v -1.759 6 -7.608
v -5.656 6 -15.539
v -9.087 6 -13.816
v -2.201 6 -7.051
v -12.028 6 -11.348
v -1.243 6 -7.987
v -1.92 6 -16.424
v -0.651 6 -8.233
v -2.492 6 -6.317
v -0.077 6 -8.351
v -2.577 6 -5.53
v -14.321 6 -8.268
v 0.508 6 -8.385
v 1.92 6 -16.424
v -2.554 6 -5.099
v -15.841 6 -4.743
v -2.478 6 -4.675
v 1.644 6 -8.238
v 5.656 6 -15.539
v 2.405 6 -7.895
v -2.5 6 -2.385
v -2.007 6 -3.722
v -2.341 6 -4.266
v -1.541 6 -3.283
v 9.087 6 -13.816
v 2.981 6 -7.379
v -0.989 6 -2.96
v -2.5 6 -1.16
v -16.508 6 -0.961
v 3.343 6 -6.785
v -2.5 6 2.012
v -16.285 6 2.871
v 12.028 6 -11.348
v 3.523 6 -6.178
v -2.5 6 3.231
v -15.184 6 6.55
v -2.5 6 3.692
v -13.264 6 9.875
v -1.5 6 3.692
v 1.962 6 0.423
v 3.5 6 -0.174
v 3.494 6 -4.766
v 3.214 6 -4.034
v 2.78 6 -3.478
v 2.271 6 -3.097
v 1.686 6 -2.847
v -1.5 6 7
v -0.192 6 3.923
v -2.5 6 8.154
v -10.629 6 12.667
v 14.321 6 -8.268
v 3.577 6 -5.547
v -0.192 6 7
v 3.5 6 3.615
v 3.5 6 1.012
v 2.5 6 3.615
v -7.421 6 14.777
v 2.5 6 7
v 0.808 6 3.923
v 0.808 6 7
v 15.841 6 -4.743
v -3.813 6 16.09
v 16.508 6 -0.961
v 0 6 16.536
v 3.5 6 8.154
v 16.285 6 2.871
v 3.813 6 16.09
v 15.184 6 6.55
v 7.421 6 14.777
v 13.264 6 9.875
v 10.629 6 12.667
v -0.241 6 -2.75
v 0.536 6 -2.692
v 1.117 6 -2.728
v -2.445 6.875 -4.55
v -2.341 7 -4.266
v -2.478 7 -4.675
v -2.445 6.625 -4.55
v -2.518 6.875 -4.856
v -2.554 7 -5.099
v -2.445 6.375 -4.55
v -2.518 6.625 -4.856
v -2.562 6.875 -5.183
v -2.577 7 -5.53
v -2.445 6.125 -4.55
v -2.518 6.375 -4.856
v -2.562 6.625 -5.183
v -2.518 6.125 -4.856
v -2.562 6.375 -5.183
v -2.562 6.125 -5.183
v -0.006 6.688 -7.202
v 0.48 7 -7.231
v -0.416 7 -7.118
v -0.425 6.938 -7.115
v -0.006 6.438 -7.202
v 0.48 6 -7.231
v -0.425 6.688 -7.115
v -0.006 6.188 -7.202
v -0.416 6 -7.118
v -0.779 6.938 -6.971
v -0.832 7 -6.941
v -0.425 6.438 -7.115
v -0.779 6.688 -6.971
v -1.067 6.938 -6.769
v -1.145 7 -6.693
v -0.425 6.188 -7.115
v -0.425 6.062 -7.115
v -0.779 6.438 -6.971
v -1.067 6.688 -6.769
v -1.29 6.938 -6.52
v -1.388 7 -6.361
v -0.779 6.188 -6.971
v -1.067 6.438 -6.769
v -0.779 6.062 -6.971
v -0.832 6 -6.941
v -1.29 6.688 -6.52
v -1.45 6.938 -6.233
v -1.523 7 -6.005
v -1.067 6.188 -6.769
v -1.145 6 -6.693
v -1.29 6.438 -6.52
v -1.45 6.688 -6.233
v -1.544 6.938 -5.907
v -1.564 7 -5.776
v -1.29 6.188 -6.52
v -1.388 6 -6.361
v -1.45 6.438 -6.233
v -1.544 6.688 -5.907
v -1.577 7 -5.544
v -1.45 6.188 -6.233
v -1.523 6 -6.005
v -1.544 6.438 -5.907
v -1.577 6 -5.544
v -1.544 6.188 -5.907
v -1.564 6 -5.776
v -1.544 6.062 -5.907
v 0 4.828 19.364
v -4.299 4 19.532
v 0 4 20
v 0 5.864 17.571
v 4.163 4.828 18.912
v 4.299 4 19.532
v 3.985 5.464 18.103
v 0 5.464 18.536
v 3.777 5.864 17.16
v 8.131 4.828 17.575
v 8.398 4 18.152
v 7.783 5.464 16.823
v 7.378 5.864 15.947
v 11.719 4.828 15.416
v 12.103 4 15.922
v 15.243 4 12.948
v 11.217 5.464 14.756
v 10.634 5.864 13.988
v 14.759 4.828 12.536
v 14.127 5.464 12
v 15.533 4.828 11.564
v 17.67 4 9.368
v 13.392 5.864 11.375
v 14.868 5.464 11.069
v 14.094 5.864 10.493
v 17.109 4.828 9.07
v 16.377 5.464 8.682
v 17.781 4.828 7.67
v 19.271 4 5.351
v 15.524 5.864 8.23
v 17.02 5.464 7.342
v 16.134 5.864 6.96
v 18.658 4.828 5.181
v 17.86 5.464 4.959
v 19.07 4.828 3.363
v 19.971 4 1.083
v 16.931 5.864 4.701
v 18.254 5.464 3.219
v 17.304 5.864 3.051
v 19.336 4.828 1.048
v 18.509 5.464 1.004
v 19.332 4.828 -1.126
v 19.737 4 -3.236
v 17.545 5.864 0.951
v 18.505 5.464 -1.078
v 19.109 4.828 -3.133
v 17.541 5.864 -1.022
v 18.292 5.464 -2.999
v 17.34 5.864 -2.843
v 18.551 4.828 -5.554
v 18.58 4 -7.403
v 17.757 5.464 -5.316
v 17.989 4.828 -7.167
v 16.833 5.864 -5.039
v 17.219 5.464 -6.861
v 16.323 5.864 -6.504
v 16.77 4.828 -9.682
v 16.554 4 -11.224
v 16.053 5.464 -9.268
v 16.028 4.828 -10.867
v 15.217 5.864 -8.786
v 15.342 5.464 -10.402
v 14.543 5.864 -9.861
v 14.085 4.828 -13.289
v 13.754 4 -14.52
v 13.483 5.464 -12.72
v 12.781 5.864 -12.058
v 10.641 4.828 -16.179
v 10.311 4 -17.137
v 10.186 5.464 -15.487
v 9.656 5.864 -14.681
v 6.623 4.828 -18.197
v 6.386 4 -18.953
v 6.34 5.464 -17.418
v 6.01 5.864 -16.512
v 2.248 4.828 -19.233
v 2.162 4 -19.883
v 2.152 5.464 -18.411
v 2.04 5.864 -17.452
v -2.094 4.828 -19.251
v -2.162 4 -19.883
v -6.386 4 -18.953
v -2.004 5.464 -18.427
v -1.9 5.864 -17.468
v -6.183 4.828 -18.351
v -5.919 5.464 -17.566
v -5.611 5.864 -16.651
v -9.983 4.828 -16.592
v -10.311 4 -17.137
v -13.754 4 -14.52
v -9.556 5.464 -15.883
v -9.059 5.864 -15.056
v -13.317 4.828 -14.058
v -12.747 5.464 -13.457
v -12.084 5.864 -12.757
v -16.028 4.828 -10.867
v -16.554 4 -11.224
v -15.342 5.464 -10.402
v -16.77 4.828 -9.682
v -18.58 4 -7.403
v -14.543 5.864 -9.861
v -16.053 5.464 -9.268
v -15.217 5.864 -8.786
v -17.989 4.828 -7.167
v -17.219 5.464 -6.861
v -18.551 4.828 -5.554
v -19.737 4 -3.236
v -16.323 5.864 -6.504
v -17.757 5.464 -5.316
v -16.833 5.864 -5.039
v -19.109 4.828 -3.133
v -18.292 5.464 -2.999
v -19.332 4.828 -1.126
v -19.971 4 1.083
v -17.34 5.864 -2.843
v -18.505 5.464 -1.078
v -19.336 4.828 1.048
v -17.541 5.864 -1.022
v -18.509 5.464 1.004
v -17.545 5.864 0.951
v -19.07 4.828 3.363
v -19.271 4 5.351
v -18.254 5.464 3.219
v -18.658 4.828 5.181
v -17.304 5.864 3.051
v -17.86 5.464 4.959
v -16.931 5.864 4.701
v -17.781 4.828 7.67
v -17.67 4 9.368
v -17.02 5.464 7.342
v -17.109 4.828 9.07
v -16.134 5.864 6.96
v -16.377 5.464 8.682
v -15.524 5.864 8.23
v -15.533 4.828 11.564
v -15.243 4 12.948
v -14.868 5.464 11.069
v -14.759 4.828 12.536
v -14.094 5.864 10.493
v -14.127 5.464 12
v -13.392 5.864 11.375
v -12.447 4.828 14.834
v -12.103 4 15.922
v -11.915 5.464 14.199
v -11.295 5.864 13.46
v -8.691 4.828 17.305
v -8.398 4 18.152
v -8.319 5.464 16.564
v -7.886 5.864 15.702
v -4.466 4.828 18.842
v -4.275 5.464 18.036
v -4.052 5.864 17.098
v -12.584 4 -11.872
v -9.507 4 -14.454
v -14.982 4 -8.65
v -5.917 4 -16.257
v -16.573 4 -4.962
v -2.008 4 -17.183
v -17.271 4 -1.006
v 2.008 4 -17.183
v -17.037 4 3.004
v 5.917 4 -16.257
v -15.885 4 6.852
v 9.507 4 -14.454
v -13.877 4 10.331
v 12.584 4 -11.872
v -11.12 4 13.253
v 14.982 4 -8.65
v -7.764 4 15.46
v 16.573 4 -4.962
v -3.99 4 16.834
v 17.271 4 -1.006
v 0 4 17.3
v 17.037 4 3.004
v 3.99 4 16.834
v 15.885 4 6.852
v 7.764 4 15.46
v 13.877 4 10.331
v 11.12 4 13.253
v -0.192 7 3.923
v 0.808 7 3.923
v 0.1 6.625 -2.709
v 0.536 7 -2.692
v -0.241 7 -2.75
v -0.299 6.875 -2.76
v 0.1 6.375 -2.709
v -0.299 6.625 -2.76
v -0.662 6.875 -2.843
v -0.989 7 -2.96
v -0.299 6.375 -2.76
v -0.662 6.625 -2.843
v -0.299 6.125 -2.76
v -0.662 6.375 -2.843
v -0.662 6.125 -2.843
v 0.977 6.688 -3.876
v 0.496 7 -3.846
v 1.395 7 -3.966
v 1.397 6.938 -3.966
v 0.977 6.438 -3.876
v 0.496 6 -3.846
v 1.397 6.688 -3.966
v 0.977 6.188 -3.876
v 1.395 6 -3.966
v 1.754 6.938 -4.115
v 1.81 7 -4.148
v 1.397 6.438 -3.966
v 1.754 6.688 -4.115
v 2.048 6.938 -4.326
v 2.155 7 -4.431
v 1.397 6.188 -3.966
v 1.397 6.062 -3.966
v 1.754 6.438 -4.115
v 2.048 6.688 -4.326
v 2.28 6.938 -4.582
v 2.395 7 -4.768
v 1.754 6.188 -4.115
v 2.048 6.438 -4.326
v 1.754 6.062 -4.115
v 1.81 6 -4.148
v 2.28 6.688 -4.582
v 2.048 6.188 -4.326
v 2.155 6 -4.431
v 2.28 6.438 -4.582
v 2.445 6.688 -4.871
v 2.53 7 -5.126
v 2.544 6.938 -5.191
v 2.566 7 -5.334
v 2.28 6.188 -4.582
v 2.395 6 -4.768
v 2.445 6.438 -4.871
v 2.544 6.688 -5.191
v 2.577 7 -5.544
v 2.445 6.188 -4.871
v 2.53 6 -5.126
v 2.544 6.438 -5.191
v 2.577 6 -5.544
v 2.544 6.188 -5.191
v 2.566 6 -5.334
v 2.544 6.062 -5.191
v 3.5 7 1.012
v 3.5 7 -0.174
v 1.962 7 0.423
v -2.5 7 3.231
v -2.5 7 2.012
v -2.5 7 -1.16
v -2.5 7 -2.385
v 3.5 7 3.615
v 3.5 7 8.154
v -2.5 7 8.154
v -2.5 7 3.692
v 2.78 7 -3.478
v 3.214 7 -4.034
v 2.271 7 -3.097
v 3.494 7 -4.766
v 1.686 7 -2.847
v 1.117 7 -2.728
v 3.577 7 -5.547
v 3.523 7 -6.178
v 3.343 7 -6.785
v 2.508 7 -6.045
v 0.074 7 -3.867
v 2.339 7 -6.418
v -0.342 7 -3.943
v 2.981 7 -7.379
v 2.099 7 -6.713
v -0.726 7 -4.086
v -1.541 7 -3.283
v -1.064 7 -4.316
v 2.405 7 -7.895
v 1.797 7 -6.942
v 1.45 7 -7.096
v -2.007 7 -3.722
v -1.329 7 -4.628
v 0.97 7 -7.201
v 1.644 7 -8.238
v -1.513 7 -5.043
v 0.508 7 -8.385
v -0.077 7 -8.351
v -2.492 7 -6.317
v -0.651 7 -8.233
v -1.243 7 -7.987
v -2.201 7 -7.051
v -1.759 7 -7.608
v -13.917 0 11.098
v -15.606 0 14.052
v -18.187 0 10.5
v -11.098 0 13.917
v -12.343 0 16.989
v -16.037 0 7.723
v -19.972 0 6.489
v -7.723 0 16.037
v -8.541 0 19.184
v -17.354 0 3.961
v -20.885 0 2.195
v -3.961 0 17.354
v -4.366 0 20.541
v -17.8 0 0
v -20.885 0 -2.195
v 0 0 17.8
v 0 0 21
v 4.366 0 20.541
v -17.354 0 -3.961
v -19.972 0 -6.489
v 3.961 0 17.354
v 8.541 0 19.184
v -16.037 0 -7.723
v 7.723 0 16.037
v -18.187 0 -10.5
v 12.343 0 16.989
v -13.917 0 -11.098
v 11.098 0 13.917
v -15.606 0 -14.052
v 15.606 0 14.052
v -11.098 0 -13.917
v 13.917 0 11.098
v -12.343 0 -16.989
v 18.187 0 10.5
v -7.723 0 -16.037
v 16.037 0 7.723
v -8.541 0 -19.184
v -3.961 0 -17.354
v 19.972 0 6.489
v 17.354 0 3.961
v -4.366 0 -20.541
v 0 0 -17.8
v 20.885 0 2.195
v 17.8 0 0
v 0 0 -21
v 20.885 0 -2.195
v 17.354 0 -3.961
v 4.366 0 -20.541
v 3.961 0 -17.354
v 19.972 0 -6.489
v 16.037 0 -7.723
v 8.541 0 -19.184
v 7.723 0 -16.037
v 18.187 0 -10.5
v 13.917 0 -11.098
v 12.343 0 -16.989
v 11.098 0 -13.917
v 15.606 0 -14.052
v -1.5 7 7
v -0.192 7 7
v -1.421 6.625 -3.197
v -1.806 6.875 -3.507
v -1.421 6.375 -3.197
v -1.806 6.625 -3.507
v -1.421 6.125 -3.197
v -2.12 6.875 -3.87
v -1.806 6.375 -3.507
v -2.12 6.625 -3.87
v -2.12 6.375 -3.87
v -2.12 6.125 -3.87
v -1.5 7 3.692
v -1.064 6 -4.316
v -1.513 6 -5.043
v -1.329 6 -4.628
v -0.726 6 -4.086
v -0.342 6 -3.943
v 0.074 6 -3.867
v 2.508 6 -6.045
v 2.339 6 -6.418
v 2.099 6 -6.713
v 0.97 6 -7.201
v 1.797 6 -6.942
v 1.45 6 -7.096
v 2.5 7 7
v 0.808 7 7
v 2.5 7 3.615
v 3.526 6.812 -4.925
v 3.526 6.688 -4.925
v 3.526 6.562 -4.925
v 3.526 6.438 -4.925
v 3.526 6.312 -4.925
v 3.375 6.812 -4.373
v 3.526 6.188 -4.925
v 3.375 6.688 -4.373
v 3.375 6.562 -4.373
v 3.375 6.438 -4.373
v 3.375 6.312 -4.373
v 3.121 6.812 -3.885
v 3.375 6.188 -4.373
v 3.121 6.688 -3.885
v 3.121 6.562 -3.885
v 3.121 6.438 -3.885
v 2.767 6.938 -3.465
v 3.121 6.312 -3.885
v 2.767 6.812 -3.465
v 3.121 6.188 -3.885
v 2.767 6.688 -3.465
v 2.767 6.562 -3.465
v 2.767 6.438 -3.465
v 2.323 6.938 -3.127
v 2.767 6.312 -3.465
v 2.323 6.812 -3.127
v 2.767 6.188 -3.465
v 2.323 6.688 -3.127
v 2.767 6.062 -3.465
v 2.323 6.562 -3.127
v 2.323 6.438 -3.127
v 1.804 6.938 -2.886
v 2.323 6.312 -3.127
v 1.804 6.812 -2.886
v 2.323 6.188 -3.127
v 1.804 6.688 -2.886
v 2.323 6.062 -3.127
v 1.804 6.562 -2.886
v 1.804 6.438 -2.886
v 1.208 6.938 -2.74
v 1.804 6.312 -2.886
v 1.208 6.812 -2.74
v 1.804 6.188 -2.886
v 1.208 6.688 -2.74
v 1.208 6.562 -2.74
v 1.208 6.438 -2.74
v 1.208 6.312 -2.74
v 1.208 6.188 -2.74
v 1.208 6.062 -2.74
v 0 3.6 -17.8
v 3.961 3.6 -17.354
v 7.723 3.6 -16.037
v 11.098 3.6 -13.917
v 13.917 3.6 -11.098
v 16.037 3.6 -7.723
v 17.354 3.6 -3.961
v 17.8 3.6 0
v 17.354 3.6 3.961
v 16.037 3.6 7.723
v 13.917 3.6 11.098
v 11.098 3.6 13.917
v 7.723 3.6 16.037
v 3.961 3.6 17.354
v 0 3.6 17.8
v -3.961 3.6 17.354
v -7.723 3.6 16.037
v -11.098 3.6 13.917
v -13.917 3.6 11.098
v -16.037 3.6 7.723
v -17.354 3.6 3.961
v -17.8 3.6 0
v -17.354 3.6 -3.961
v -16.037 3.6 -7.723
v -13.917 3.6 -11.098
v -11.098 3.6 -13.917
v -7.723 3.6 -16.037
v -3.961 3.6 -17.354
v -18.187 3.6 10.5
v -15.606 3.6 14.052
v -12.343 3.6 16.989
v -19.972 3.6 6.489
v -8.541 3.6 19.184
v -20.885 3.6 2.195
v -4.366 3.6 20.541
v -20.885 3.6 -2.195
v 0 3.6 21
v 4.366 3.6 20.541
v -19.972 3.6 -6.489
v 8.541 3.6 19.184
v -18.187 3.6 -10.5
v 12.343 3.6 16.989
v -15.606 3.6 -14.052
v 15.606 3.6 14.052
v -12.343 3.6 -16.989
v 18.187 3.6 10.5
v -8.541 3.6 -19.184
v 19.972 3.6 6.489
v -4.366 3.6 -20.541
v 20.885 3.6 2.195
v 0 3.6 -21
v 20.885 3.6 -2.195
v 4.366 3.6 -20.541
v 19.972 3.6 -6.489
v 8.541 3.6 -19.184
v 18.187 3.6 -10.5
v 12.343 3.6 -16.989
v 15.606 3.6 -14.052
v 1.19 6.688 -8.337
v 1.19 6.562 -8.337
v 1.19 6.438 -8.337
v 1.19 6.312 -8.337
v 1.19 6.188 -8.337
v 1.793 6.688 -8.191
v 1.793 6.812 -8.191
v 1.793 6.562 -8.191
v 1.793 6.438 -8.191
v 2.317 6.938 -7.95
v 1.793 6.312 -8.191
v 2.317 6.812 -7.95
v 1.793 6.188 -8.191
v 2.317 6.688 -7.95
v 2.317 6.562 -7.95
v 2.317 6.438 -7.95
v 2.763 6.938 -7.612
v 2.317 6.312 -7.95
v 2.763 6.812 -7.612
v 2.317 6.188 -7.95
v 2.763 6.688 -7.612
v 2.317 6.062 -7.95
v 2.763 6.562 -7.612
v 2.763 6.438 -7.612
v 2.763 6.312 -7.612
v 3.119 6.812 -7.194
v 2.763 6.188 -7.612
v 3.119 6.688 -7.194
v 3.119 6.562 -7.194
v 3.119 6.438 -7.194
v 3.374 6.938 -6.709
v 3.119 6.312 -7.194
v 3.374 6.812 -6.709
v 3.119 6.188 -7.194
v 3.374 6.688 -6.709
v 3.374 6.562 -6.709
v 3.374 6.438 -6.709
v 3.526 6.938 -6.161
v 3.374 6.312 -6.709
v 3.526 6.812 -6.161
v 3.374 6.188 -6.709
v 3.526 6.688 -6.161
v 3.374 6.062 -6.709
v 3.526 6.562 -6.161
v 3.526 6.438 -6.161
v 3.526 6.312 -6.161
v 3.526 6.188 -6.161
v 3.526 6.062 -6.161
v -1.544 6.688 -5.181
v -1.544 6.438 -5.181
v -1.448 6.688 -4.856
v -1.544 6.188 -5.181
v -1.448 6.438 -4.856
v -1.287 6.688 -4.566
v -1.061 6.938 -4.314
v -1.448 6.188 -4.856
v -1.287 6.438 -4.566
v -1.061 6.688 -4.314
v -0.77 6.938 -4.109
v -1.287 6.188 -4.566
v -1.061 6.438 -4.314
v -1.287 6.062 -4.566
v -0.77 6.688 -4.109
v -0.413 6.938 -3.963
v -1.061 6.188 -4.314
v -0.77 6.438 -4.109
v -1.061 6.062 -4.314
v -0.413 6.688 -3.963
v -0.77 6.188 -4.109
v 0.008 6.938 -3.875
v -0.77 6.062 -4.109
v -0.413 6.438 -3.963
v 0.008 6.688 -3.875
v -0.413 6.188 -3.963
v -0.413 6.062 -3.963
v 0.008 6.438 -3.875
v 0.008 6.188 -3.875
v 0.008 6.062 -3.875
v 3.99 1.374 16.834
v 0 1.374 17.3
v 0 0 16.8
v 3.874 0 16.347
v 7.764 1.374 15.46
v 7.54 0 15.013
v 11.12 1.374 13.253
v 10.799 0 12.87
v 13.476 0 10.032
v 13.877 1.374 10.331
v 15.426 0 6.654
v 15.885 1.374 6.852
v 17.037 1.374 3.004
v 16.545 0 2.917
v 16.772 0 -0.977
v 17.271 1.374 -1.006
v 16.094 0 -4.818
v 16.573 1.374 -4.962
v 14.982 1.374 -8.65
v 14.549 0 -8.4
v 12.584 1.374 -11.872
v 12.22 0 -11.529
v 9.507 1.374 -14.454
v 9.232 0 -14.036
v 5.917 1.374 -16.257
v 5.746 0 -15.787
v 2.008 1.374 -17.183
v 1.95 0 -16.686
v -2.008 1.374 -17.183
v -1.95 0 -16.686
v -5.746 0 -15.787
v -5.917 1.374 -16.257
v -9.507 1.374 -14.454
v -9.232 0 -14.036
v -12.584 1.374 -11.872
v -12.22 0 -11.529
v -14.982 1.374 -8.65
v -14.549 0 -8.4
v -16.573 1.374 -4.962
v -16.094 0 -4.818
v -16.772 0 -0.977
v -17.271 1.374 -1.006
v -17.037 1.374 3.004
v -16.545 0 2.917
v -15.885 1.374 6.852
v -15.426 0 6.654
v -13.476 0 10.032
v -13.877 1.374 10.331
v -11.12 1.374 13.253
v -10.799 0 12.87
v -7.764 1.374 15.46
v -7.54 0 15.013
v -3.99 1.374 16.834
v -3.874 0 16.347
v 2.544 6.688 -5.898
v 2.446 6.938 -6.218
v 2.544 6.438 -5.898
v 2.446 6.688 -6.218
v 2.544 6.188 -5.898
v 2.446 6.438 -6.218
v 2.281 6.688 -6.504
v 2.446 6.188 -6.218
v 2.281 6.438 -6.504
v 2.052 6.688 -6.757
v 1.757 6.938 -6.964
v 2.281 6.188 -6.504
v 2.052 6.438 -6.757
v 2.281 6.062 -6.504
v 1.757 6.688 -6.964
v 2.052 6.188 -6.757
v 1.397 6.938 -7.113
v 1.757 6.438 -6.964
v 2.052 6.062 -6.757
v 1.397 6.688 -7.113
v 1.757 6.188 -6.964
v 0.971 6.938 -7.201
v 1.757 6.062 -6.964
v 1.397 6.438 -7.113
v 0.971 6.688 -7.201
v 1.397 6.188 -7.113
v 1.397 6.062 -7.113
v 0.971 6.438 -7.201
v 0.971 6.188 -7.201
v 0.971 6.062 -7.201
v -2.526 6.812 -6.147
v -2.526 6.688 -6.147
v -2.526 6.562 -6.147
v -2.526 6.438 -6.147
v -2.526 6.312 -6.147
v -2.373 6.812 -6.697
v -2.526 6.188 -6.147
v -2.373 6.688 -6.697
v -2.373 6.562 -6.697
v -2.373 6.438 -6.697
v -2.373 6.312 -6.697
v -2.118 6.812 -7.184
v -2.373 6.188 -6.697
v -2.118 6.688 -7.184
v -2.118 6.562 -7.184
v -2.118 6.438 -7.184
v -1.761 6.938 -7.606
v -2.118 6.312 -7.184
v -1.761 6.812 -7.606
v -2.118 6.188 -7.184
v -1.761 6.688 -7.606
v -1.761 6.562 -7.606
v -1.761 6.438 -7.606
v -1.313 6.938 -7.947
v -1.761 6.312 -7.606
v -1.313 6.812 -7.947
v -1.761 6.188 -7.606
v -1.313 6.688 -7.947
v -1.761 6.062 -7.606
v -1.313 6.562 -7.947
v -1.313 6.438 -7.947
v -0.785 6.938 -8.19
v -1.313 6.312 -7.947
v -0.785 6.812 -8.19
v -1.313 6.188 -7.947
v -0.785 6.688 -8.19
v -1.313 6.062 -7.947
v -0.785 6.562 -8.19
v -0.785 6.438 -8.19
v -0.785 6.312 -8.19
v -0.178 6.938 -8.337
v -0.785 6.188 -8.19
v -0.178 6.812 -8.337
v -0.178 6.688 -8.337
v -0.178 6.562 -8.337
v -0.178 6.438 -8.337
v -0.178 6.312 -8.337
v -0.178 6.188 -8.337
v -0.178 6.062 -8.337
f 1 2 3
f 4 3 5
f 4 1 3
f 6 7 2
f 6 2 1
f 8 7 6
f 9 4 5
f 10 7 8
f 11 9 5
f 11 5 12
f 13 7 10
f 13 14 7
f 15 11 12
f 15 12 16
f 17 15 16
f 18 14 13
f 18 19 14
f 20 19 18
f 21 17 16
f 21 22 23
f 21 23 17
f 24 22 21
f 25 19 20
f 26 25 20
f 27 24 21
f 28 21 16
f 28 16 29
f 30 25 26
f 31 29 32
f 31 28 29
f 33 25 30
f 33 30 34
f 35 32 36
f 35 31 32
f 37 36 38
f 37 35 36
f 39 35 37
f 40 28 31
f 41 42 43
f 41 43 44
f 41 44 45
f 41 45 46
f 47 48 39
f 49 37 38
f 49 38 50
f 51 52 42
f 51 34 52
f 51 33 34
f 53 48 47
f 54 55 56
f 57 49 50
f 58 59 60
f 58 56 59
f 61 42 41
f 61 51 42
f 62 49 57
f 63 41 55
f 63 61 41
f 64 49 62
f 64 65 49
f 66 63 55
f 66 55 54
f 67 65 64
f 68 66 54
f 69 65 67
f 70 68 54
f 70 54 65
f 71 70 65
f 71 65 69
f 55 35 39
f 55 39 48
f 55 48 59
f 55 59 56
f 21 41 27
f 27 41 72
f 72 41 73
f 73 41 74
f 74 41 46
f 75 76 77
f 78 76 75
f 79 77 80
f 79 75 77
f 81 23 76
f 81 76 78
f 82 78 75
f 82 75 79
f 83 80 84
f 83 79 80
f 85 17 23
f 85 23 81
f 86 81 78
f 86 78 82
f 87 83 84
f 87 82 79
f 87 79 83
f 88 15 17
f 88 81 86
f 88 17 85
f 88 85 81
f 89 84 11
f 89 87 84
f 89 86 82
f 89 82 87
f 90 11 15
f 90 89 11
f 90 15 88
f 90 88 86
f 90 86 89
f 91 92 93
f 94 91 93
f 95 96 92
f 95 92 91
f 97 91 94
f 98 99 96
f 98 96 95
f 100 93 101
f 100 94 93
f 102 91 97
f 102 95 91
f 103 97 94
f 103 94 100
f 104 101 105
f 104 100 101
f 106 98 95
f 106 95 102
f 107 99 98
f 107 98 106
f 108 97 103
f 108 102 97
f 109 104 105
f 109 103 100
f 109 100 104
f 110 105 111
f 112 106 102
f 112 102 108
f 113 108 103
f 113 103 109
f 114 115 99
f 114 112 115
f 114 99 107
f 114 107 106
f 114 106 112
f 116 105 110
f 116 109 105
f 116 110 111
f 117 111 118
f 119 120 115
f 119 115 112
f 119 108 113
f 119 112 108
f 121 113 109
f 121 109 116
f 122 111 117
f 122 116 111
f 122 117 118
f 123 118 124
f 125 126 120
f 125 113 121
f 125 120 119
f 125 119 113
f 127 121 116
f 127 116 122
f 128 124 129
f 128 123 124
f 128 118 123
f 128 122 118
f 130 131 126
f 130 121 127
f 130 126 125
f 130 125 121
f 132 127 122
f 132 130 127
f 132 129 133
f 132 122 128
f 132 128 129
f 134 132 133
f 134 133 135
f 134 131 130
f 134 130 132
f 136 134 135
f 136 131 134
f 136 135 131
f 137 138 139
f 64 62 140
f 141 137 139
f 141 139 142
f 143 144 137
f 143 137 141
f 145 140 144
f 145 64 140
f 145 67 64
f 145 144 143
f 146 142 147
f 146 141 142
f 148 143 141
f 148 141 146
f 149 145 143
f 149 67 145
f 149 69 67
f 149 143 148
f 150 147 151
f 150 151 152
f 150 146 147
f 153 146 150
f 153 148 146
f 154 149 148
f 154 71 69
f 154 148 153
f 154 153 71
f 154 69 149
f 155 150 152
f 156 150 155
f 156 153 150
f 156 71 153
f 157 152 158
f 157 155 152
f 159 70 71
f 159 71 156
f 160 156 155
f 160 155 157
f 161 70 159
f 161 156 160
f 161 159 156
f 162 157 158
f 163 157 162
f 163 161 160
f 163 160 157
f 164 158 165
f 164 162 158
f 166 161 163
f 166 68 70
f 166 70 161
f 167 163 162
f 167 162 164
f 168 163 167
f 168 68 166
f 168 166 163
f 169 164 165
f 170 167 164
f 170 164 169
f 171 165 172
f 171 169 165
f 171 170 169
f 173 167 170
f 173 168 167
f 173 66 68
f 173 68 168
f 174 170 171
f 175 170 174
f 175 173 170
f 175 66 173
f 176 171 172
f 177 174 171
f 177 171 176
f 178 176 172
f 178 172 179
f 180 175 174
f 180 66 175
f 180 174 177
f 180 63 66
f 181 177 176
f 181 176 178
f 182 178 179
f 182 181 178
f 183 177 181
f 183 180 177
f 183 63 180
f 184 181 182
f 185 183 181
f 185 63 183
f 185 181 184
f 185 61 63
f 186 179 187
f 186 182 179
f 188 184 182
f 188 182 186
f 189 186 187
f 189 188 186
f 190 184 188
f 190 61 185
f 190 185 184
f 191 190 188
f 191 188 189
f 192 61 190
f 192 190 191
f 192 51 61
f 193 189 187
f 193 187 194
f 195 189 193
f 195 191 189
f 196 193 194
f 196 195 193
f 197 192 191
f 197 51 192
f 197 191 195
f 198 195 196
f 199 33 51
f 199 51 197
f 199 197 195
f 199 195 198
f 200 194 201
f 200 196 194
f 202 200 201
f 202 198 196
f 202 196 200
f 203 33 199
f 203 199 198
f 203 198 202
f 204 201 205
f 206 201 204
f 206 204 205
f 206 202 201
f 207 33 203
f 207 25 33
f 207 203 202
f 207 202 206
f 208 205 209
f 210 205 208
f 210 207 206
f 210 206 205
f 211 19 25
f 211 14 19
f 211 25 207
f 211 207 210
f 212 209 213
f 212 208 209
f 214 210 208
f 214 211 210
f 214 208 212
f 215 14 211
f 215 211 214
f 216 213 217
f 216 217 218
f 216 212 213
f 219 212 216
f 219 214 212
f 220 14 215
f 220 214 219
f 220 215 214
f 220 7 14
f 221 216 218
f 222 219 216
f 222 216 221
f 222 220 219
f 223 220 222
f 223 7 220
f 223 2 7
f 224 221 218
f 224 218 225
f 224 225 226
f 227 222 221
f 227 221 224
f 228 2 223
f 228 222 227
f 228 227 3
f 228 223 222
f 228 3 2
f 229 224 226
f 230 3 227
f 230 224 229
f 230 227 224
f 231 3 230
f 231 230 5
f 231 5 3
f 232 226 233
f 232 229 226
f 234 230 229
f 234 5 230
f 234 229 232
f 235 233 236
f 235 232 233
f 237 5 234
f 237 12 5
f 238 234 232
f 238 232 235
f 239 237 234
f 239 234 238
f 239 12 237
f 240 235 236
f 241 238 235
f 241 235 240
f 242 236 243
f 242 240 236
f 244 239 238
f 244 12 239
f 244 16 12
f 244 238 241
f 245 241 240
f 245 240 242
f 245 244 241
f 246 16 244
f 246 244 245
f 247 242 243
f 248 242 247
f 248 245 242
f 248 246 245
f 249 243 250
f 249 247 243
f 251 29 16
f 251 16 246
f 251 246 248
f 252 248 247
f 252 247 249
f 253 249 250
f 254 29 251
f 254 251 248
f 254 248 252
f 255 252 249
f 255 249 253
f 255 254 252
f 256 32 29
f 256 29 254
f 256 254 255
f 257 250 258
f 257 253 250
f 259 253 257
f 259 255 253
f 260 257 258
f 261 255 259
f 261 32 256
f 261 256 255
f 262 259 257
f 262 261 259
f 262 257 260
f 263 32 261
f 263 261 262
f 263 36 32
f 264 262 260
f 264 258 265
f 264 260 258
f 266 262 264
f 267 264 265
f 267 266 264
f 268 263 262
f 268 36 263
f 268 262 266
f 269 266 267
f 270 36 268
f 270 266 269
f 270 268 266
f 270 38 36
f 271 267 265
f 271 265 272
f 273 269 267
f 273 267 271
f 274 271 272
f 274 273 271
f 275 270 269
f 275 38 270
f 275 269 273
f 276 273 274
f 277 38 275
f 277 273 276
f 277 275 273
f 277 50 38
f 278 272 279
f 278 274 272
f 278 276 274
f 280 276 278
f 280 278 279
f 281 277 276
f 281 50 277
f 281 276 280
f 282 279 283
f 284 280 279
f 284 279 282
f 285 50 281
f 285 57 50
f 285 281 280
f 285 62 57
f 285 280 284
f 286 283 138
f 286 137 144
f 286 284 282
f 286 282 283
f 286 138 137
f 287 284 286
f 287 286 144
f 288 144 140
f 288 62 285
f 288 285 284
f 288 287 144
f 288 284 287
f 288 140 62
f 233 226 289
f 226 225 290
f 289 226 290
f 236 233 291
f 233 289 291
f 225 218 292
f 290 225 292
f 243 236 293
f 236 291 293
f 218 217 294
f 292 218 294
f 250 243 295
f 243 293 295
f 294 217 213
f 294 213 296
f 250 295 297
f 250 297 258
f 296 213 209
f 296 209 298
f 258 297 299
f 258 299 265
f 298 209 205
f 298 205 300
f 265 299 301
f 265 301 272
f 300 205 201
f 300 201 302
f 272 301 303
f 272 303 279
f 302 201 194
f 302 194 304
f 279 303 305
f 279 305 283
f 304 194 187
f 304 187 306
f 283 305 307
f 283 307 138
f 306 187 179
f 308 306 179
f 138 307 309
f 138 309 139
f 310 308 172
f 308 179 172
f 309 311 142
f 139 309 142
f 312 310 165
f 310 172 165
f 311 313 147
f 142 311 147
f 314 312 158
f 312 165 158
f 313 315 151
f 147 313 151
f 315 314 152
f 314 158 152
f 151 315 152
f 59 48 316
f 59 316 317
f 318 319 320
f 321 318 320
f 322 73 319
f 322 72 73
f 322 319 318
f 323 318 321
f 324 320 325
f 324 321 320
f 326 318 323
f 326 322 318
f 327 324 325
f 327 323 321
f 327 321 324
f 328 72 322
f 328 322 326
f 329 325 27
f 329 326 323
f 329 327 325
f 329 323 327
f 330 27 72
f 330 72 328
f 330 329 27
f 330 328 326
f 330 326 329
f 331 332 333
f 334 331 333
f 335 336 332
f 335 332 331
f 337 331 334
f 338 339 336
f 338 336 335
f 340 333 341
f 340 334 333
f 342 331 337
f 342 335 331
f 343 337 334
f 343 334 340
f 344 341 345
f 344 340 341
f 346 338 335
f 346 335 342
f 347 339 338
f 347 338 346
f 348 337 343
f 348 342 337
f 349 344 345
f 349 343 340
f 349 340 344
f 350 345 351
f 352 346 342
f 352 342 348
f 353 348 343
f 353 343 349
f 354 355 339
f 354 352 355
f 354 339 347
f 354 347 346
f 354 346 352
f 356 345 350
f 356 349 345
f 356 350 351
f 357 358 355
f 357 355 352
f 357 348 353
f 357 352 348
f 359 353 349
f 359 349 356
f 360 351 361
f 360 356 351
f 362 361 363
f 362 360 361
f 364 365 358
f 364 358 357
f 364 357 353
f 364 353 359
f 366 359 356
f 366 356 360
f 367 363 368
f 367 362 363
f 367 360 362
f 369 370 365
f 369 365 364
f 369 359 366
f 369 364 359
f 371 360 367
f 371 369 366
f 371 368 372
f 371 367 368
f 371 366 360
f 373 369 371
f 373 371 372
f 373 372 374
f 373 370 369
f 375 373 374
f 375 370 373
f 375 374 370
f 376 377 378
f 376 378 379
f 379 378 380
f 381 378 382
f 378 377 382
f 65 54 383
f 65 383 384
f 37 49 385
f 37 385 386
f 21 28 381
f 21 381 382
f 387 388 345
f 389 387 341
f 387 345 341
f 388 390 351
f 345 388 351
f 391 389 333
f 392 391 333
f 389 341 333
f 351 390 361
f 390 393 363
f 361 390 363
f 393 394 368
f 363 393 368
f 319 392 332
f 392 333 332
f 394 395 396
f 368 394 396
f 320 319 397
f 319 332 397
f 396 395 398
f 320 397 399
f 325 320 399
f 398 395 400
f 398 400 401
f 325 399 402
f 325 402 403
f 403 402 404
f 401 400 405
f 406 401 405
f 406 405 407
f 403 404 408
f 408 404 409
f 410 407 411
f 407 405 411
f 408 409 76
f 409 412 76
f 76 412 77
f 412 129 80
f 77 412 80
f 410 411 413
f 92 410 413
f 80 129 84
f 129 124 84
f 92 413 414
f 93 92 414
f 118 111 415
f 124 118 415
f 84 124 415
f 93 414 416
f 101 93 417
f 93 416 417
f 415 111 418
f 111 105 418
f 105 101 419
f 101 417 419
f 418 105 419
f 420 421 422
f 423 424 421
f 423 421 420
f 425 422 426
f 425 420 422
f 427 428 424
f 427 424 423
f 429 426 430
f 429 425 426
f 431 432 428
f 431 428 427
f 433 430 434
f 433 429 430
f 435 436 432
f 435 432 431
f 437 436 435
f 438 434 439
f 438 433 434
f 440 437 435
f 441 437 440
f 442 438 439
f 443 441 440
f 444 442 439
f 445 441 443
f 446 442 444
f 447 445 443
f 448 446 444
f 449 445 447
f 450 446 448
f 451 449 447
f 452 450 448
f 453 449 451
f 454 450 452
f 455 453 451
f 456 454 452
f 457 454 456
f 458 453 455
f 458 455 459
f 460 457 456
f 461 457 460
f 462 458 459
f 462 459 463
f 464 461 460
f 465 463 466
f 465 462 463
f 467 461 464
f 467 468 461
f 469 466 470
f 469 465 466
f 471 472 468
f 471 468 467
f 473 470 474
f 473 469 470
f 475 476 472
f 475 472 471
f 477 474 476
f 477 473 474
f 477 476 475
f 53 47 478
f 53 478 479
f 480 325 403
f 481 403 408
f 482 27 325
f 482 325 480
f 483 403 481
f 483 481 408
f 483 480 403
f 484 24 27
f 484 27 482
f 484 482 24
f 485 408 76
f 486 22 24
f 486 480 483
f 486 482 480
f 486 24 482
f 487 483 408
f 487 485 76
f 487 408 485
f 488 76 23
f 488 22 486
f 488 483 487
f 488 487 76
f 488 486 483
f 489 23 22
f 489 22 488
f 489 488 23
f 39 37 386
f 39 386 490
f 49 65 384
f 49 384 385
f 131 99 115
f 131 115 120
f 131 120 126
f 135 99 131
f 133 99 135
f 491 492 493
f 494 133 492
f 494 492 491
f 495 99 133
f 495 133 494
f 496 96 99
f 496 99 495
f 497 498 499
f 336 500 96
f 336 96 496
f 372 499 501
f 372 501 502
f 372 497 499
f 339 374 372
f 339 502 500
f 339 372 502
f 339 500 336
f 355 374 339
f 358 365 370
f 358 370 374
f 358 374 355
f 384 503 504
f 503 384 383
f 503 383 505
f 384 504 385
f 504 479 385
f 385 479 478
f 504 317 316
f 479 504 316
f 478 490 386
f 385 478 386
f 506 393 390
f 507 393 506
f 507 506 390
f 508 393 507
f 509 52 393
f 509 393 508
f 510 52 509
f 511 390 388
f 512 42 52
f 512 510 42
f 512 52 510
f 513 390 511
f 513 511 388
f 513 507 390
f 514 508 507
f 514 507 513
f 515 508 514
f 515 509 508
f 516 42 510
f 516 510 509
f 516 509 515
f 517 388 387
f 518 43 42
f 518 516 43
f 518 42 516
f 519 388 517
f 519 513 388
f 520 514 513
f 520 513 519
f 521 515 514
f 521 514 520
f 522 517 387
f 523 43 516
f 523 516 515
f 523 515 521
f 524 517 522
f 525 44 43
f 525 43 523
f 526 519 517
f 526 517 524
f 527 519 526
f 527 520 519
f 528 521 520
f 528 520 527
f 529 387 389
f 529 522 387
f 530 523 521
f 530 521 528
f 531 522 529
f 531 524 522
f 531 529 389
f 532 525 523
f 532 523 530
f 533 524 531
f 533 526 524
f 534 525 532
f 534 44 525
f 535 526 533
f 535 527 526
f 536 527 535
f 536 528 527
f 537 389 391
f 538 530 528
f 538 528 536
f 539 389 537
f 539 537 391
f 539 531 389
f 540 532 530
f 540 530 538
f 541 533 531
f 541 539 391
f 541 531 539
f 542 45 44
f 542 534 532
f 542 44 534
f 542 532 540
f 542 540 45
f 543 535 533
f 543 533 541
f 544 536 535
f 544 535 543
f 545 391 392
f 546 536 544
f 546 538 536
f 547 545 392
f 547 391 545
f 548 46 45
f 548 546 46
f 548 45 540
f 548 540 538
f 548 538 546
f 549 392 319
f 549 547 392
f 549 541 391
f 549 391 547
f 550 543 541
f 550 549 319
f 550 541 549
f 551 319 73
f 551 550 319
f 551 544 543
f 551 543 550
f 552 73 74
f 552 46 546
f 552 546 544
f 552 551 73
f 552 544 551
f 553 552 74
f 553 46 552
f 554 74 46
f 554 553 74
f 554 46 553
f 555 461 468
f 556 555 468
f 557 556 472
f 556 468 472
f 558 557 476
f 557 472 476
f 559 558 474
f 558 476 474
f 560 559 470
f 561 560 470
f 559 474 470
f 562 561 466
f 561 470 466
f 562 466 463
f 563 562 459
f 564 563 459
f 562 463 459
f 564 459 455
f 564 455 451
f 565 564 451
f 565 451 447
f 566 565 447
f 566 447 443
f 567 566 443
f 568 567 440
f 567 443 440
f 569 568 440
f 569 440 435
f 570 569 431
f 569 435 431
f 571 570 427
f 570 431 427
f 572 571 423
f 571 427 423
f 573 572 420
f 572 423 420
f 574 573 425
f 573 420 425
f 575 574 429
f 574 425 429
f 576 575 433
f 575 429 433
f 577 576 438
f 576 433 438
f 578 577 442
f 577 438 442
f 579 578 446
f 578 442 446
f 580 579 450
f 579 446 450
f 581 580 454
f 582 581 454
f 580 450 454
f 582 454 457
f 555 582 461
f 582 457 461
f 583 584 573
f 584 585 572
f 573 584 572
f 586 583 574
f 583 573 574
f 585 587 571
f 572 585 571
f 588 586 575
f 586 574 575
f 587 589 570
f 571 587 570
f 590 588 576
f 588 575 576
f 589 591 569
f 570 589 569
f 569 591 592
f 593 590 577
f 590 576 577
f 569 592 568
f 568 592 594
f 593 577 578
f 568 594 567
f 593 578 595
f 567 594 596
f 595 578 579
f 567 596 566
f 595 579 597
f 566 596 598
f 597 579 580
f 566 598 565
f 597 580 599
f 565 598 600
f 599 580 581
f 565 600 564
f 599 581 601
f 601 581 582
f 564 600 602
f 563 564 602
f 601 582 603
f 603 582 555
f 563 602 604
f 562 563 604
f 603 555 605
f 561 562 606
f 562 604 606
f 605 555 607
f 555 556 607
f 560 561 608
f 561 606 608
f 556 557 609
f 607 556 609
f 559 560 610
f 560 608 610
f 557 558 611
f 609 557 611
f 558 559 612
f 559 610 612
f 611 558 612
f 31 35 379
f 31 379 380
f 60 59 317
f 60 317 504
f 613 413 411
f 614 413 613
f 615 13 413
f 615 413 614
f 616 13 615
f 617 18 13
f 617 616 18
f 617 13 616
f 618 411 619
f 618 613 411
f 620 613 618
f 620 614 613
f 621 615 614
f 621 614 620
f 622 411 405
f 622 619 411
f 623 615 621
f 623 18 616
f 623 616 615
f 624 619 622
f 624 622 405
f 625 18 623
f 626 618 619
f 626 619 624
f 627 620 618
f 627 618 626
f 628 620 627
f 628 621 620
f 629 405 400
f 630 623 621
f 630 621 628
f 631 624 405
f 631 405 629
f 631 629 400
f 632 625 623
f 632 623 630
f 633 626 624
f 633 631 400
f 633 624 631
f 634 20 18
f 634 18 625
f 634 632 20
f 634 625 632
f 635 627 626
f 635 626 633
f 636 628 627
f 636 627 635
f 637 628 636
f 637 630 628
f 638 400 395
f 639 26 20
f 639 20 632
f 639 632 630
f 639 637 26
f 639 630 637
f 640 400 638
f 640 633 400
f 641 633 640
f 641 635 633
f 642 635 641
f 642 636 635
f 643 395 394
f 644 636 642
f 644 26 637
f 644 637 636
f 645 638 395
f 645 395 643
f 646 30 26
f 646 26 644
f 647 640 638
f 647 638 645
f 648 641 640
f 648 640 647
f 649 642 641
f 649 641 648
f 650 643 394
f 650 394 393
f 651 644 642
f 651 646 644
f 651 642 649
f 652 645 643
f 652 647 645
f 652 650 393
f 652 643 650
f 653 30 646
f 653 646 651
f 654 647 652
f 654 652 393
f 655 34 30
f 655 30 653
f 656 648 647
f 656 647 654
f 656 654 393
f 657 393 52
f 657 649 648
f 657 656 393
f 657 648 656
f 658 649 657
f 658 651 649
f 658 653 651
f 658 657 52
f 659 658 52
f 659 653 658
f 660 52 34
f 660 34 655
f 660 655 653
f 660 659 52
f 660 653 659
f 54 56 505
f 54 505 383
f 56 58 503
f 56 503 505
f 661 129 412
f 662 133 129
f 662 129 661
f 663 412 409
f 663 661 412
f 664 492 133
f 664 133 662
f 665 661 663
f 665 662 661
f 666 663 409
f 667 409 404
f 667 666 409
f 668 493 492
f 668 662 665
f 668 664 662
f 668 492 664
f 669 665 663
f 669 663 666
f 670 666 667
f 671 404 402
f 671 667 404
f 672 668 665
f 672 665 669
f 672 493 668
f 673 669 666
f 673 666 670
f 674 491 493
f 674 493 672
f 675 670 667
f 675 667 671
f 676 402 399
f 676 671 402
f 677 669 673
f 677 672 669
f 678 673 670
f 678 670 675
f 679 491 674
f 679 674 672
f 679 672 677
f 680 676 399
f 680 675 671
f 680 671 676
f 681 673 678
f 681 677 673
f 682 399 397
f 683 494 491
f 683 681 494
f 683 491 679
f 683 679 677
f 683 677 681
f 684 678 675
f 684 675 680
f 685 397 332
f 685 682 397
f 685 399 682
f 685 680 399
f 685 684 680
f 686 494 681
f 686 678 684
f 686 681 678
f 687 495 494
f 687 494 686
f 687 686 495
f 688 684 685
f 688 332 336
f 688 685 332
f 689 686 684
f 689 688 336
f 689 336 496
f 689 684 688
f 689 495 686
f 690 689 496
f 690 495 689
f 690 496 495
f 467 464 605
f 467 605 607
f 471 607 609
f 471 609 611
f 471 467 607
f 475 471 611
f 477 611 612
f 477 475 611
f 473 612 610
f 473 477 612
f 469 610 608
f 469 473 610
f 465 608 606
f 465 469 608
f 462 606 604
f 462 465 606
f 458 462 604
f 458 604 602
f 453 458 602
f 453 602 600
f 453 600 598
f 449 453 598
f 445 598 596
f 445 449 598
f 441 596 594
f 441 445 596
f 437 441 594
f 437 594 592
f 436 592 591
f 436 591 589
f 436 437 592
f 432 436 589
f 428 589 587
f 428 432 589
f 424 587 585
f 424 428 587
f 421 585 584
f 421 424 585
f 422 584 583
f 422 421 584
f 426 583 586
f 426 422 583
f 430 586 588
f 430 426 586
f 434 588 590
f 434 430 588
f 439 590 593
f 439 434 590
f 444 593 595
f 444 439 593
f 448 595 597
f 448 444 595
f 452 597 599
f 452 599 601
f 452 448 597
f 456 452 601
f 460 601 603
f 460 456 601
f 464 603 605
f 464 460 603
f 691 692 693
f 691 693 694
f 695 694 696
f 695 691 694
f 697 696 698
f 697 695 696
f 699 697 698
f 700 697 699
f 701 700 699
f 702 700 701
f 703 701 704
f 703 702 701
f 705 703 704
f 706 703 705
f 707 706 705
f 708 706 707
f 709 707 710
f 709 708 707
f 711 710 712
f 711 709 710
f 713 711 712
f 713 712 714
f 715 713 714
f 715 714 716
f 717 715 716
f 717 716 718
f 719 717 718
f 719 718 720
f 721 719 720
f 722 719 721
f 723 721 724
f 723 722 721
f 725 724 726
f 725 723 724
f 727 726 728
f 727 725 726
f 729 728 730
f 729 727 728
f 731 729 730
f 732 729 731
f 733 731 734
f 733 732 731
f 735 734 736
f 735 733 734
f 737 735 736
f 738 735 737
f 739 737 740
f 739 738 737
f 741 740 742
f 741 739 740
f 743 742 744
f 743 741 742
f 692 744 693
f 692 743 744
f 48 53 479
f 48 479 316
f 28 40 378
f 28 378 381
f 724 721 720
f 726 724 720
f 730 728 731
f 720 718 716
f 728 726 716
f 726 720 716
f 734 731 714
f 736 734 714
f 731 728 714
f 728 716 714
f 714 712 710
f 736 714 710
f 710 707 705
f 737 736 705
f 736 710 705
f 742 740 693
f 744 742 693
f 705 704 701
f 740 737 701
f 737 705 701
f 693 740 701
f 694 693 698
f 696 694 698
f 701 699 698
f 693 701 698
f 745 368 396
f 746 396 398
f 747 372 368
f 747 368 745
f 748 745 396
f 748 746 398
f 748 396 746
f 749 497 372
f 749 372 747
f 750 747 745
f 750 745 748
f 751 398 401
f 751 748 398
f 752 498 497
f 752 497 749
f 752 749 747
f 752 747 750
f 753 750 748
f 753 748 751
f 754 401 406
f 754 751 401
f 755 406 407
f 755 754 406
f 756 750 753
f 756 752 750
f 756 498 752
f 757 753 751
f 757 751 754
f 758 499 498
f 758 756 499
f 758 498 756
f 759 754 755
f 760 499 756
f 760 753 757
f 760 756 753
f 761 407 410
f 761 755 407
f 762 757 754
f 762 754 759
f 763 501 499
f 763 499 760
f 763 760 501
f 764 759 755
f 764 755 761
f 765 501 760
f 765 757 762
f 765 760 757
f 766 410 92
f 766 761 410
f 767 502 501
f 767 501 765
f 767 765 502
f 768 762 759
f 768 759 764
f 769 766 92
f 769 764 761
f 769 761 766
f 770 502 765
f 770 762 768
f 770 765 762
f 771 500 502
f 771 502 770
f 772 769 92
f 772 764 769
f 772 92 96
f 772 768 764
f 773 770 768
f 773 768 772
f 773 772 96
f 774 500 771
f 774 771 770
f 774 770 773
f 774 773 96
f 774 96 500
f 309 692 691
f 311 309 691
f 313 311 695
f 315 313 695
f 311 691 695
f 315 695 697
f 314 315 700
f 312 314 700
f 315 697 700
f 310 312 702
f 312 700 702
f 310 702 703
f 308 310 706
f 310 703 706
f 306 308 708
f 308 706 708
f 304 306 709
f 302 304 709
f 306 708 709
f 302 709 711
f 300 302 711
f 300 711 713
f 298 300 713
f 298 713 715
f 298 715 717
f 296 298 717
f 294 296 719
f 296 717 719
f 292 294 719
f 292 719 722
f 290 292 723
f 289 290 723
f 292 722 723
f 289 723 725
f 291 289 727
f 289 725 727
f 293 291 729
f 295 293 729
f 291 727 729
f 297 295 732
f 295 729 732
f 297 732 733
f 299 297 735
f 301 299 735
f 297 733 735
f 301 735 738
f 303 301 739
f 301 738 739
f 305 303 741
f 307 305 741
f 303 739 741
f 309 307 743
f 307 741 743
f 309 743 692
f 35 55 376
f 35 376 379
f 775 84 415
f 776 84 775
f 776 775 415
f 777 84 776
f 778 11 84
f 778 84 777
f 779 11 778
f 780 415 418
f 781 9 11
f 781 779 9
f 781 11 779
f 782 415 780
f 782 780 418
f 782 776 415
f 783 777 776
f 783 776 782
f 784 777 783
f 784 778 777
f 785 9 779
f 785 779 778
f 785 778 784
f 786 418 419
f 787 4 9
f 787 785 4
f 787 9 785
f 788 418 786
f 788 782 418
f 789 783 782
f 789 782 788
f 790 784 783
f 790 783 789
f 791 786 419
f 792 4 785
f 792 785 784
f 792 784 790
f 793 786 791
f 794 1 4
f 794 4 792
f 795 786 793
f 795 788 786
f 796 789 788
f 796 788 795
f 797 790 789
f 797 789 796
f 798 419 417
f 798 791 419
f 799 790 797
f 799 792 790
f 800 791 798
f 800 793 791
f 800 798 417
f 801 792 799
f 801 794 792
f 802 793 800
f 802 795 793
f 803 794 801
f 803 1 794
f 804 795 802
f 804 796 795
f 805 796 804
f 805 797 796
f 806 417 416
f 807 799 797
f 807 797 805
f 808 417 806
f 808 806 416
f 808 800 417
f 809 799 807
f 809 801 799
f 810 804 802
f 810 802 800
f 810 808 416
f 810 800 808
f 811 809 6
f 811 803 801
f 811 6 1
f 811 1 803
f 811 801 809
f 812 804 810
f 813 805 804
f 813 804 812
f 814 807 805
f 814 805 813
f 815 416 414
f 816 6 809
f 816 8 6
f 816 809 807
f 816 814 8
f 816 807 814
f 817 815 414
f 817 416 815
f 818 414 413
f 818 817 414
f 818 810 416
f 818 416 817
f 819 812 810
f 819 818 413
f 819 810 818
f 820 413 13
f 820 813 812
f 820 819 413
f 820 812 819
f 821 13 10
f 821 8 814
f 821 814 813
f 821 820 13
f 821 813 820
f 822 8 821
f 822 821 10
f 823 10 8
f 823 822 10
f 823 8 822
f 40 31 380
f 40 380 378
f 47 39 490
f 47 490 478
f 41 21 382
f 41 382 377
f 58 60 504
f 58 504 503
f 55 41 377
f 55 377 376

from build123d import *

# Parameters (mm, degrees)
SKETCH1_R           = 17.3
BOSS_EXTRUDE1_DEPTH = 4
SKETCH2_R           = 20
BOSS_EXTRUDE2_DEPTH = 2
CHAMFER1_SIZE       = 0.5
CHAMFER1_SIZE2      = 1.37373871
BOSS_EXTRUDE3_DEPTH = 1
SKETCH4_R           = 21
SKETCH4_R_2         = 17.8
BOSS_EXTRUDE4_DEPTH = 3.6
FILLET1_R           = 4


with BuildPart() as part:
    # Sketch1 → Boss-Extrude1 (new body)
    with BuildSketch(Plane(origin=(0, 0, 0), x_dir=(1, 0, 0), z_dir=(0, 1, 0))):
        with Locations(Location((0, 0, 0), (0, 0, 270))):
            Circle(SKETCH1_R)
    extrude(amount=BOSS_EXTRUDE1_DEPTH)

    # Sketch2 → Boss-Extrude2 (add)
    with BuildSketch(Plane(origin=(0, 4, 0), x_dir=(1, 0, 0), z_dir=(0, 1, 0))):
        with Locations(Location((0, 0, 0), (0, 0, 270))):
            Circle(SKETCH2_R)
    extrude(amount=BOSS_EXTRUDE2_DEPTH)

    # Chamfer1
    chamfer1_edges = [part.edges().sort_by_distance(p)[0] for p in [
        (0, 0, -17.3),
    ]]
    chamfer1_side = [part.faces().sort_by_distance(p)[0] for p in [
        (0, 0, 0),
    ]]
    chamfer(chamfer1_edges, length=CHAMFER1_SIZE, length2=CHAMFER1_SIZE2, reference=chamfer1_side[0])

    # Sketch3 → Boss-Extrude3 (add)
    # profile 1 of 3: a face of its own
    with BuildSketch(Plane(origin=(0, 6, 0), x_dir=(1, 0, 0), z_dir=(0, 1, 0))):
        Polygon((3.5, -8.153846154), (-2.5, -8.153846154), (-2.5, -3.692307692), (-1.5, -3.692307692), (-1.5, -7), (-0.192307692, -7), (-0.192307692, -3.923076923), (0.807692308, -3.923076923), (0.807692308, -7), (2.5, -7), (2.5, -3.615384615), (3.5, -3.615384615), align=None)
    # profile 2 of 3: a face of its own
    with BuildSketch(Plane(origin=(0, 6, 0), x_dir=(1, 0, 0), z_dir=(0, 1, 0))):
        Polygon((3.5, -1.012019231), (-2.5, -3.230769231), (-2.5, -2.012019231), (1.961538462, -0.423076923), (-2.5, 1.159855769), (-2.5, 2.384615385), (3.5, 0.174278846), align=None)
    # profile 3 of 3: a face of its own
    with BuildSketch(Plane(origin=(0, 6, 0), x_dir=(1, 0, 0), z_dir=(0, 1, 0))):
        with BuildLine():
            add(Edge.make_bspline(
                [(0.536057692, 2.692307692), (0.461912169, 2.692732288), (0.316299931, 2.693566139), (0.102681311, 2.708014837), (-0.102080111, 2.727059346), (-0.297178935, 2.7580733), (-0.48352829, 2.794557032), (-0.66107286, 2.840188498), (-0.829190002, 2.895158255), (-0.936530981, 2.938887132), (-0.989182692, 2.960336538)],
                knots=[0, 0, 0, 0, 1.141009212, 2.240794809, 3.294380675, 4.305229195, 5.280013876, 6.216333343, 7.125095522, 8, 8, 8, 8], degree=3))
            add(Edge.make_bspline(
                [(-0.989182692, 2.960336538), (-1.064045062, 2.995381495), (-1.212889297, 3.065059221), (-1.423284081, 3.194940159), (-1.622520045, 3.340957789), (-1.807985373, 3.503762135), (-1.976273284, 3.679250682), (-2.121442274, 3.8662452), (-2.246924651, 4.059835868), (-2.310075686, 4.197471854), (-2.341346154, 4.265625)],
                knots=[0, 0, 0, 0, 1.031298788, 2.050467816, 3.080965632, 4.112446372, 5.127889083, 6.11150152, 7.064873096, 8, 8, 8, 8], degree=3))
            add(Edge.make_bspline(
                [(-2.341346154, 4.265625), (-2.36032292, 4.311889746), (-2.398679804, 4.405402593), (-2.446551204, 4.550732565), (-2.485444553, 4.701576766), (-2.520210675, 4.856844152), (-2.54418306, 5.018042238), (-2.564283081, 5.183868476), (-2.574817852, 5.355230377), (-2.576213703, 5.47114174), (-2.576923077, 5.530048077)],
                knots=[0, 0, 0, 0, 0.92659354, 1.872881803, 2.832850937, 3.813025581, 4.820167273, 5.851730198, 6.908245912, 8, 8, 8, 8], degree=3))
            add(Edge.make_bspline(
                [(-2.576923077, 5.530048077), (-2.574279131, 5.635524435), (-2.569104893, 5.841943116), (-2.531731982, 6.143462843), (-2.468624386, 6.428792059), (-2.377410507, 6.69696489), (-2.263391215, 6.950293554), (-2.121963134, 7.186809415), (-1.954657548, 7.4068641), (-1.763766491, 7.61002662), (-1.54963122, 7.793006532), (-1.314219689, 7.95230111), (-1.058428096, 8.08634923), (-0.783133069, 8.195583929), (-0.488073589, 8.280950362), (-0.173547671, 8.341759709), (0.160999915, 8.378135477), (0.390531821, 8.382416673), (0.508413462, 8.384615385)],
                knots=[0, 0, 0, 0, 1.064649597, 2.083533894, 3.06182455, 4.009573214, 4.938114978, 5.86134754, 6.785138072, 7.723633163, 8.670337, 9.622734556, 10.587021061, 11.579917593, 12.607721694, 13.68331646, 14.81021135, 16, 16, 16, 16], degree=3))
            add(Edge.make_bspline(
                [(0.508413462, 8.384615385), (0.625502693, 8.382457893), (0.853453552, 8.378257659), (1.185418087, 8.341337664), (1.498255599, 8.282445298), (1.790928875, 8.196577649), (2.065135144, 8.088924118), (2.31824048, 7.954255311), (2.553777896, 7.798191605), (2.765616292, 7.615499739), (2.957600047, 7.415749174), (3.122950989, 7.195975576), (3.264570499, 6.961180913), (3.378919342, 6.709233585), (3.468254689, 6.441775319), (3.531847225, 6.157933395), (3.569076319, 5.857562209), (3.574269344, 5.651947799), (3.576923077, 5.546875)],
                knots=[0, 0, 0, 0, 1.188441339, 2.313673251, 3.386638619, 4.416397407, 5.405891428, 6.372077474, 7.321986495, 8.268353052, 9.206290124, 10.129648818, 11.054654577, 11.984788619, 12.932788448, 13.912688147, 14.933344701, 16, 16, 16, 16], degree=3))
            add(Edge.make_bspline(
                [(3.576923077, 5.546875), (3.574250081, 5.440606648), (3.56901826, 5.232608955), (3.532086394, 4.928968883), (3.467844147, 4.642664358), (3.380536597, 4.372254659), (3.265682212, 4.118902272), (3.126018439, 3.881878952), (2.959462483, 3.662813738), (2.769780203, 3.461379628), (2.558558225, 3.27879165), (2.324518577, 3.123001073), (2.073634225, 2.987947467), (1.802109992, 2.880585343), (1.512738113, 2.79442276), (1.20385391, 2.735695183), (0.876307406, 2.698636721), (0.651547296, 2.694455929), (0.536057692, 2.692307692)],
                knots=[0, 0, 0, 0, 1.080851458, 2.115536814, 3.105208919, 4.06142606, 5.000707585, 5.928846123, 6.853919921, 7.79375822, 8.738786042, 9.687076824, 10.64785939, 11.631623957, 12.651566366, 13.714523363, 14.825642194, 16, 16, 16, 16], degree=3))
        make_face()
        with BuildLine():
            add(Edge.make_bspline(
                [(0.496394231, 3.846153846), (0.579389989, 3.847306669), (0.740109696, 3.849539087), (0.973391986, 3.873312358), (1.191472619, 3.909400041), (1.394129342, 3.962438602), (1.581421488, 4.029554109), (1.753502267, 4.111253032), (1.909905592, 4.20892881), (2.049040642, 4.322529511), (2.172879925, 4.4466519), (2.282174308, 4.578623761), (2.372534629, 4.720877366), (2.447682974, 4.870085953), (2.50513219, 5.02757294), (2.548258299, 5.192351574), (2.571811156, 5.365902285), (2.575200825, 5.484309712), (2.576923077, 5.544471154)],
                knots=[0, 0, 0, 0, 1.313714757, 2.543983635, 3.708927593, 4.810629344, 5.856122632, 6.85490097, 7.821198974, 8.76835797, 9.692418868, 10.594039946, 11.475666139, 12.355144307, 13.23425633, 14.12512326, 15.047396847, 16, 16, 16, 16], degree=3))
            add(Edge.make_bspline(
                [(2.576923077, 5.544471154), (2.575236293, 5.604641115), (2.571916431, 5.723065308), (2.547872097, 5.896396901), (2.506620801, 6.061523779), (2.449345655, 6.21830978), (2.37340808, 6.365936861), (2.283346485, 6.50641813), (2.175254899, 6.637412989), (2.0529265, 6.760856514), (1.913005947, 6.871483063), (1.756584116, 6.96830124), (1.583471675, 7.049966229), (1.394252357, 7.117087633), (1.188592806, 7.168820628), (0.966466826, 7.203435724), (0.728485546, 7.227401244), (0.564166666, 7.22962456), (0.479567308, 7.230769231)],
                knots=[0, 0, 0, 0, 0.949303347, 1.86838219, 2.75460872, 3.63067551, 4.495816858, 5.369073575, 6.258675874, 7.17059545, 8.106564835, 9.066168793, 10.067192861, 11.120964654, 12.229518689, 13.408091079, 14.665559114, 16, 16, 16, 16], degree=3))
            add(Edge.make_bspline(
                [(0.479567308, 7.230769231), (0.395783975, 7.229478346), (0.233529589, 7.226978424), (-0.00143621, 7.205149769), (-0.220079654, 7.169527516), (-0.422514597, 7.119497213), (-0.608712267, 7.054862228), (-0.77836884, 6.975148016), (-0.932085204, 6.881490733), (-1.068558354, 6.772812379), (-1.18731946, 6.651813065), (-1.292414499, 6.522505793), (-1.379732754, 6.382400276), (-1.453273108, 6.233471369), (-1.507814258, 6.074064924), (-1.547601053, 5.905828868), (-1.572100606, 5.728279375), (-1.575291742, 5.6066494), (-1.576923077, 5.544471154)],
                knots=[0, 0, 0, 0, 1.332239421, 2.580008232, 3.749024652, 4.852419255, 5.89224124, 6.878439556, 7.828083302, 8.748549668, 9.645153656, 10.519845698, 11.393144178, 12.26513999, 13.155815239, 14.066102797, 15.011375811, 16, 16, 16, 16], degree=3))
            add(Edge.make_bspline(
                [(-1.576923077, 5.544471154), (-1.575316276, 5.482285395), (-1.572173131, 5.360640724), (-1.547275797, 5.182809612), (-1.508646128, 5.014061126), (-1.451092454, 4.854614019), (-1.37797532, 4.704814324), (-1.289278248, 4.563496917), (-1.184152388, 4.431962749), (-1.062491387, 4.310564904), (-0.924951921, 4.200214761), (-0.769728259, 4.105041523), (-0.598166899, 4.024868471), (-0.410754627, 3.958185569), (-0.20667787, 3.909097891), (0.012838891, 3.871293652), (0.249181199, 3.850082068), (0.412218797, 3.847491396), (0.496394231, 3.846153846)],
                knots=[0, 0, 0, 0, 0.981853791, 1.920653289, 2.83086505, 3.71158433, 4.591757822, 5.459075689, 6.341611823, 7.24548826, 8.168543921, 9.120390574, 10.113981418, 11.154755163, 12.256733604, 13.425033512, 14.670558662, 16, 16, 16, 16], degree=3))
        make_face(mode=Mode.SUBTRACT)
    extrude(amount=BOSS_EXTRUDE3_DEPTH)

    # Fillet1
    # the kernel refuses this fillet: 4 mm, written as the material it takes off along each edge
    with BuildSketch(Plane(origin=(0, 6, 0), x_dir=(0, 0, 1), z_dir=(-1, 0, 0))) as fillet1_piece_1:
        with BuildLine():
            CenterArc((16.535898385, -4), FILLET1_R, 30, 60)
            Line((16.535898385, 0), (16.535898385, 0.08))
            Line((16.535898385, 0.08), (20, 0.08))
            Line((20, 0.08), (20.08, 0))
            ThreePointArc((20.08, 0), (20.08, -1), (20.069282032, -1.96))
            Line((20.069282032, -1.96), (20, -2))
        make_face()
    revolve(axis=Axis((0, 6, 0), (0, 1, 0)), mode=Mode.SUBTRACT)


with BuildPart() as body_2:
    # Sketch4 → Boss-Extrude4 (new body)
    with BuildSketch(Plane.XZ):
        with Locations(Location((0, 0, 0), (0, 0, 270))):
            Circle(SKETCH4_R)
        with Locations(Location((0, 0, 0), (0, 0, 270))):
            Circle(SKETCH4_R_2, mode=Mode.SUBTRACT)
    extrude(amount=-BOSS_EXTRUDE4_DEPTH)


solid = Compound([part.part, body_2.part])
